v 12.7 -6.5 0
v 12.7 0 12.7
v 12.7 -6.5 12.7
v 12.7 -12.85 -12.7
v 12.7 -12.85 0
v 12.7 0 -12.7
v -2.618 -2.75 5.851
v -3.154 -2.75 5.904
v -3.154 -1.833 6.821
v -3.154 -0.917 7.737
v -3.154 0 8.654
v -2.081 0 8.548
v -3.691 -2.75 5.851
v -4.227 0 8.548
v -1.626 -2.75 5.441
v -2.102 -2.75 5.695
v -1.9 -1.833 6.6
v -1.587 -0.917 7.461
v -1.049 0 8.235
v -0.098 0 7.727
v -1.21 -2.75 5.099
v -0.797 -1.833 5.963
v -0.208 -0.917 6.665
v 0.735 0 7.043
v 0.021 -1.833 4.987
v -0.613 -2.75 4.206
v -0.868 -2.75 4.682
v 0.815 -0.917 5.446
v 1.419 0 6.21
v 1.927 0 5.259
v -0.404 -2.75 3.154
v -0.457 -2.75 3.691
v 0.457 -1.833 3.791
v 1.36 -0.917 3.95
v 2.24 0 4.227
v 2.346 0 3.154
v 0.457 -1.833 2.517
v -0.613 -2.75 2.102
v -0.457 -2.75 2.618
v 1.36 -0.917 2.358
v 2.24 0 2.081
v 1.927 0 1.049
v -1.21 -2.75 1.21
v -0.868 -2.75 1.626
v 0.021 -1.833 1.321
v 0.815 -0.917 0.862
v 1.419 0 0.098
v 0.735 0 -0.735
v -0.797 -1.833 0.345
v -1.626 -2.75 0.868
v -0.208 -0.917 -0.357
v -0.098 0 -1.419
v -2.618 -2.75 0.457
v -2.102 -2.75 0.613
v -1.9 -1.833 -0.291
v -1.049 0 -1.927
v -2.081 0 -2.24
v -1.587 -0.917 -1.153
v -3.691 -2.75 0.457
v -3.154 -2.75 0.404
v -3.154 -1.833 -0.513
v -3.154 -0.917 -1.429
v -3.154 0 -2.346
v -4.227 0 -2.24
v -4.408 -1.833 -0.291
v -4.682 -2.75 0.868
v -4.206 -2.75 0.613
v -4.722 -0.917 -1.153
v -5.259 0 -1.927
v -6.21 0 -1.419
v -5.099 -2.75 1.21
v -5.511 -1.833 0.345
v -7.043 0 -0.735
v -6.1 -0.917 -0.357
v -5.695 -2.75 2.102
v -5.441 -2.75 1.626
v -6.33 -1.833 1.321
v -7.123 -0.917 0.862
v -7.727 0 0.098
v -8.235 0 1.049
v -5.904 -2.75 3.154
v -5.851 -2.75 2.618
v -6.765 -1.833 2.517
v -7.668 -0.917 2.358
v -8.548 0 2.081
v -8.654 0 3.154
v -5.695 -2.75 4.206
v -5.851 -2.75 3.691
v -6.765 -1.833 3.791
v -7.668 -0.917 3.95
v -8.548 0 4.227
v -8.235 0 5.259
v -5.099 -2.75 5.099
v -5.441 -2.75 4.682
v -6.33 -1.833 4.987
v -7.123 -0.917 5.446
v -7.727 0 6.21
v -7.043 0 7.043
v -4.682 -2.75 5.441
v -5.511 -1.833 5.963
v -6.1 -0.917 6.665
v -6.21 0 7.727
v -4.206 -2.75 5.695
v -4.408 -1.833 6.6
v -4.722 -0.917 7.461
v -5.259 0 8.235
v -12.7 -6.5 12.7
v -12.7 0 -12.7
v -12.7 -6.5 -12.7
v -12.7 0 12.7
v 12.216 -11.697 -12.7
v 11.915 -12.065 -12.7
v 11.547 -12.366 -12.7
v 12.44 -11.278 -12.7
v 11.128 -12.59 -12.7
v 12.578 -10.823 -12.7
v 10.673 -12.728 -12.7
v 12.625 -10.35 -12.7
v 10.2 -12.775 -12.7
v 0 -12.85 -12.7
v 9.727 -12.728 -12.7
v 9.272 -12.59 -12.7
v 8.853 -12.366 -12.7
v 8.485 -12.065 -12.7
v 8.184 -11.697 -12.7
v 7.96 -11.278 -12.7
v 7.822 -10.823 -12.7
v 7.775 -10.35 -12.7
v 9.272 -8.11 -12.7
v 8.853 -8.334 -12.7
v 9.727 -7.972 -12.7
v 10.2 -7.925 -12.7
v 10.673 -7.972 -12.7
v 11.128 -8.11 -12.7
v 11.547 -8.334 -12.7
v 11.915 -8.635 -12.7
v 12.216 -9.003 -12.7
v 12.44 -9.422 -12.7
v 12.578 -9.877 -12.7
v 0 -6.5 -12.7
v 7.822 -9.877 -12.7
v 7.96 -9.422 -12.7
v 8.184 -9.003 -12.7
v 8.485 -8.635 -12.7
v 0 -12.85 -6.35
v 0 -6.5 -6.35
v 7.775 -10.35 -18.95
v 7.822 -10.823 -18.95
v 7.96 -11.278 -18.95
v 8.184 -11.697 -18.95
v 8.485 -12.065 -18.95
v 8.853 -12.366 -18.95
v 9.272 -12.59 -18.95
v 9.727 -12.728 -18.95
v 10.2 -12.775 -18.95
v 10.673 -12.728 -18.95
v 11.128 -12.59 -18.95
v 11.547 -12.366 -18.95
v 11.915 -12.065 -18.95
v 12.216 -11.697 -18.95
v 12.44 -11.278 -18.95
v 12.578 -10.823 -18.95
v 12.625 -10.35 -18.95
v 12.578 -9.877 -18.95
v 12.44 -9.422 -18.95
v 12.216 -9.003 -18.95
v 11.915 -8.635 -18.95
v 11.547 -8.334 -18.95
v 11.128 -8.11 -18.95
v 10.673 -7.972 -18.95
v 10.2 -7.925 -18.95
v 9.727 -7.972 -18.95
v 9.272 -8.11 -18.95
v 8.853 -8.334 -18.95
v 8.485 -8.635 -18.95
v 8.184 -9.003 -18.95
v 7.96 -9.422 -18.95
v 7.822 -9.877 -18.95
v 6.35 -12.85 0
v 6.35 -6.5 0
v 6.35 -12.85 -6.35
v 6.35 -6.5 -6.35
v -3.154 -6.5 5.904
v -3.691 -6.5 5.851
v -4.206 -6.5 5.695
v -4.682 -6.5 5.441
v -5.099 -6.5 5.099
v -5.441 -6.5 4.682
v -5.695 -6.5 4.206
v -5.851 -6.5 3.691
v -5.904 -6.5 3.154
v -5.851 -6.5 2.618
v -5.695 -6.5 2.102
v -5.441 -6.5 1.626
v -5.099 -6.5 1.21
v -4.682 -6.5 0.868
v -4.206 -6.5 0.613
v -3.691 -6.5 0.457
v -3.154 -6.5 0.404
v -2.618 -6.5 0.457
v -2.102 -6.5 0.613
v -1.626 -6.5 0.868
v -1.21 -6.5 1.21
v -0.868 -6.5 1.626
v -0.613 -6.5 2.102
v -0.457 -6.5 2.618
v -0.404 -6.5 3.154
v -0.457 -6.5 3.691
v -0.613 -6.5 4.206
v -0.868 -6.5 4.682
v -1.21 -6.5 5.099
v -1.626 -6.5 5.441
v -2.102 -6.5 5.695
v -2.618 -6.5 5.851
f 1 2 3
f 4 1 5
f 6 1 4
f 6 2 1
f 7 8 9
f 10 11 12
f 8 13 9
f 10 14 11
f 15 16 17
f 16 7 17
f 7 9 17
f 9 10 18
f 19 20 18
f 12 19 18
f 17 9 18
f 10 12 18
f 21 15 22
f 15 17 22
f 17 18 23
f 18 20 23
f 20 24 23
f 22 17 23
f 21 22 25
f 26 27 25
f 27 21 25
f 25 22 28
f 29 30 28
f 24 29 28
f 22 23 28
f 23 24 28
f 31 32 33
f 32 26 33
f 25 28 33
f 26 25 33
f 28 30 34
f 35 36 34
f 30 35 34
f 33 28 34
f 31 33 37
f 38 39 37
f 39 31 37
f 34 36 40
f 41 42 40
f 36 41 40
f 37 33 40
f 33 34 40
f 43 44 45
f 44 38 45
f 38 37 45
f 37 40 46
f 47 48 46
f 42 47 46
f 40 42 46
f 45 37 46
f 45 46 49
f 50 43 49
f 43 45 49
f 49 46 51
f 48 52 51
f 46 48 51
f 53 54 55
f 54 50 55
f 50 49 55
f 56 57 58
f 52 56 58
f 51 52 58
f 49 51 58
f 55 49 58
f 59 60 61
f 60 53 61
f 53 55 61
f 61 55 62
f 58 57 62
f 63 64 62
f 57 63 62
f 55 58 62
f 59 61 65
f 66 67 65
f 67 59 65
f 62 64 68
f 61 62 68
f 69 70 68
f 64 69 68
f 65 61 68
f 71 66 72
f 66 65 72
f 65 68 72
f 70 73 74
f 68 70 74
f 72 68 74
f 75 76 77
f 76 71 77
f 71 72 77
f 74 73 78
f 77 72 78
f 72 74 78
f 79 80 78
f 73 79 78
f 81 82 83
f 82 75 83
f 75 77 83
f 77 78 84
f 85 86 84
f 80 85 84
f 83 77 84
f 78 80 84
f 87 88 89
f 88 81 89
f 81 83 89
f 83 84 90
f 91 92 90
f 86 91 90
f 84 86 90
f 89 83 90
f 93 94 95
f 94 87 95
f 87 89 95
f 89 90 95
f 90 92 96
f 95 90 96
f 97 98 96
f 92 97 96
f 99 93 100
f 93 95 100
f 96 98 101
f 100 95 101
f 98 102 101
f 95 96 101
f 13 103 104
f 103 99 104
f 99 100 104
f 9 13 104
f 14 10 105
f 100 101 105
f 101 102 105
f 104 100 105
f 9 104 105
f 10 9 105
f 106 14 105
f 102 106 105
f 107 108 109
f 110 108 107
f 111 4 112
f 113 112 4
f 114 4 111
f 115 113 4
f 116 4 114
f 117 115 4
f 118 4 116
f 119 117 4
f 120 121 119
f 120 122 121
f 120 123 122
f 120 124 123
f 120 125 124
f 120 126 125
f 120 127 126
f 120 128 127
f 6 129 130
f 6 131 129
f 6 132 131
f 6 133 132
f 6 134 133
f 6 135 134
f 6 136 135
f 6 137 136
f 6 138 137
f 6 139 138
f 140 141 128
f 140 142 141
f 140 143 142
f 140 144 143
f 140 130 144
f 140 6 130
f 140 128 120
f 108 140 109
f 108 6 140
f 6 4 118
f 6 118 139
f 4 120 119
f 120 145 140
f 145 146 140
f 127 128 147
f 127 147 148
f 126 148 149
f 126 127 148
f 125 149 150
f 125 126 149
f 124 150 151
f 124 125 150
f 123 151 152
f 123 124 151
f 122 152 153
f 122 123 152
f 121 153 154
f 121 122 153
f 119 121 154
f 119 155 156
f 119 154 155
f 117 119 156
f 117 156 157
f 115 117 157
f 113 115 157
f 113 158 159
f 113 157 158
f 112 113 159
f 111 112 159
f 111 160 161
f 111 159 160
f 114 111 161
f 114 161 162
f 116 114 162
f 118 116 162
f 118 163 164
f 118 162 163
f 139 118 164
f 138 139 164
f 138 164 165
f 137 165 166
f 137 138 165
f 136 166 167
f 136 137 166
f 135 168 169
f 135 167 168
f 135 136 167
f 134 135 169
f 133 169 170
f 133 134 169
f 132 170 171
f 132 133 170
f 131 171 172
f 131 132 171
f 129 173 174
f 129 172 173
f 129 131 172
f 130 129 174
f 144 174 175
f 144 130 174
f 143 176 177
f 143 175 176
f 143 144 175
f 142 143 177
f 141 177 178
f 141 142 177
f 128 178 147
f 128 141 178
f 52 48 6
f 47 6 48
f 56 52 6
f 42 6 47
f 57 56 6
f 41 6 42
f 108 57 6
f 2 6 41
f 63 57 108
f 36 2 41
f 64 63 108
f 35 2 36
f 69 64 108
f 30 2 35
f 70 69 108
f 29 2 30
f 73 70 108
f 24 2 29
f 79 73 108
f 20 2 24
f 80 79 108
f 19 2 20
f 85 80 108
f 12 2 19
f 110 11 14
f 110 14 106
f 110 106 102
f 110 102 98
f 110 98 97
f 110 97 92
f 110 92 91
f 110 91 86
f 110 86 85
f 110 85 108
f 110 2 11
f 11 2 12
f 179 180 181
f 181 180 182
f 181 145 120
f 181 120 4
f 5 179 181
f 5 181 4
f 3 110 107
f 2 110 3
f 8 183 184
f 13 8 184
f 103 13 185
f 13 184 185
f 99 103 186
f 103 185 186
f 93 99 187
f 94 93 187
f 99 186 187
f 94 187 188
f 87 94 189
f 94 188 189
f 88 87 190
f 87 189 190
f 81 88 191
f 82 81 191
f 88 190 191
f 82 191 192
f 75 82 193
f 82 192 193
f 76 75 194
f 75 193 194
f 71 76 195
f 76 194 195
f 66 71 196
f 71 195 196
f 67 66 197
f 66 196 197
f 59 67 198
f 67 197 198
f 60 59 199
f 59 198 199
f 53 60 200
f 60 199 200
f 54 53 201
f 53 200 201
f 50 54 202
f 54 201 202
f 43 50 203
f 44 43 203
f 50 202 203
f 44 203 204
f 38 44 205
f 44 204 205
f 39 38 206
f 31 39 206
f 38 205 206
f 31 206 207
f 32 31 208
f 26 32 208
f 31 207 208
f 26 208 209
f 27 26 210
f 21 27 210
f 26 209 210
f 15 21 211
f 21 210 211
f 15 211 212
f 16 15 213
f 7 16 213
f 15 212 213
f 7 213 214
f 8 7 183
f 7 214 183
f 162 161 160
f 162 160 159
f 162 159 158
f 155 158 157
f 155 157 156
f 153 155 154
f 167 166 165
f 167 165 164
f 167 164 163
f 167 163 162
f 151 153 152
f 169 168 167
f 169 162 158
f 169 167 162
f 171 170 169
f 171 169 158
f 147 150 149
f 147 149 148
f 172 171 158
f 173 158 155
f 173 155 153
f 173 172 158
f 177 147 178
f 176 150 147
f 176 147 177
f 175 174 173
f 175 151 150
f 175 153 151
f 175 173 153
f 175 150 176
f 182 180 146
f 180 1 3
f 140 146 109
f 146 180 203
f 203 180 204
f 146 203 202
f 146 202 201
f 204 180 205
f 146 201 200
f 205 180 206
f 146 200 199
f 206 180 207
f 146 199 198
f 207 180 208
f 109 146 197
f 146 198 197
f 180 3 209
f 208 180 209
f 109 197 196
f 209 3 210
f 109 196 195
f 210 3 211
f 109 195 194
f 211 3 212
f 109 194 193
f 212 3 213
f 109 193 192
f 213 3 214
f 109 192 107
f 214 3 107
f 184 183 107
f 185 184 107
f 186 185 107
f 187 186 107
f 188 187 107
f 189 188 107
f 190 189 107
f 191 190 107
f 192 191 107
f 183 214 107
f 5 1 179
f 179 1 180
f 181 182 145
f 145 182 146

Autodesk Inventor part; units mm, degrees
ref_plane "YZ Plane" through (0, 0, 0) normal (1, 0, 0) x (0, 1, 0)
ref_plane "XZ Plane" through (0, 0, 0) normal (0, 1, 0) x (-1, 0, 0)
ref_plane "XY Plane" through (0, 0, 0) normal (0, 0, 1) x (1, 0, 0)
sketch "Sketch2" plane through (0, 0, 0) normal (0, 1, 0) x (-1, 0, 0)
  line L0 (12.7, 12.7) -> (-12.7, 12.7)
  line L1 (-12.7, 12.7) -> (-12.7, -12.7)
  line L2 (-12.7, -12.7) -> (12.7, -12.7)
  line L3 (12.7, -12.7) -> (12.7, 12.7)
  line L4 (12.7, 0) -> (-12.7, 0) construction
  line L5 (0, -12.7) -> (0, 12.7) construction
  point P0 (0, 0)
  point P1 (0, 0)
  dimension "d2" = 25.4
  dimension "d3" = 25.4
extrude "Base" add sketch "Sketch2" against normal blind 6.5
sketch "Sketch10" plane through (0, -6.5, 0) normal (0, -1, 0) x (1, 0, 0)
  line L0 (-12.7, -12.7) -> (12.7, -12.7) projected
  line L1 (12.7, -12.7) -> (12.7, 0)
  line L2 (12.7, 0) -> (6.35, 0)
  line L3 (6.35, 0) -> (6.35, -12.7)
  line L4 (6.35, -12.7) -> (12.7, -12.7)
  line L5 (0, -12.7) -> (6.35, -12.7)
  line L6 (6.35, -12.7) -> (6.35, -6.35)
  line L7 (6.35, -6.35) -> (0, -6.35)
  line L8 (0, -6.35) -> (0, -12.7)
  point P0 (0, 0)
  dimension "d44" = 6.35
  dimension "d45" = 12.7
  dimension "d46" = 6.35
  dimension "d47" = 6.35
extrude "Extrusion5" add sketch "Sketch10" along normal blind 6.35
sketch "Sketch11" plane through (0, 0, 0) normal (0, 1, 0) x (1, 0, 0)
  line L0 (12.7, -12.7) -> (-12.7, -12.7) projected
  line L1 (-12.7, -12.7) -> (-3.1541, -3.1541) construction
  line L2 (-12.7, -12.7) -> (0.8, -12.7) construction
  circle A0 centre (-3.1541, -3.1541) radius 5.5 construction
  point P0 (0, 0)
  dimension "d50" = 13.5
  dimension "d51" = 45
  dimension "d52" = 11
hole "Hole3" at (-3.1541, 0, 3.1541) direction (0, -1, 0) diameter 5.5 end through all countersink diameter 11 countersink angle 90
sketch "Sketch12" plane through (12.7, 0, -12.7) normal (0, 0, -1) x (-1, 0, 0)
  line L0 (12.7, -6.5) -> (12.7, -12.85) projected
  line L1 (0, -6.5) -> (25.4, -6.5) construction
  line L2 (12.7, -6.5) -> (0, -6.5)
  line L3 (0, -6.5) -> (0, -12.85) construction
  line L4 (0, -12.85) -> (5, -12.85) construction
  line L5 (5, -12.85) -> (5, -7.85) construction
  line L6 (5, -7.85) -> (0, -7.85) construction
  line L7 (0, -7.85) -> (0, -12.85) construction
  line L8 (5, -7.85) -> (0, -12.85) construction
  line L9 (5, -12.85) -> (0, -7.85) construction
  circle A0 centre (2.5, -10.35) radius 2.425
  point P0 (12.7, 0)
  dimension "d60" = 5
  dimension "d61" = 5
  dimension "d62" = 4.85
extrude "Extrusion6" add sketch "Sketch12" along normal blind 6.25
equation "\"d3\" = d2"
properties part number "Door pin right"
